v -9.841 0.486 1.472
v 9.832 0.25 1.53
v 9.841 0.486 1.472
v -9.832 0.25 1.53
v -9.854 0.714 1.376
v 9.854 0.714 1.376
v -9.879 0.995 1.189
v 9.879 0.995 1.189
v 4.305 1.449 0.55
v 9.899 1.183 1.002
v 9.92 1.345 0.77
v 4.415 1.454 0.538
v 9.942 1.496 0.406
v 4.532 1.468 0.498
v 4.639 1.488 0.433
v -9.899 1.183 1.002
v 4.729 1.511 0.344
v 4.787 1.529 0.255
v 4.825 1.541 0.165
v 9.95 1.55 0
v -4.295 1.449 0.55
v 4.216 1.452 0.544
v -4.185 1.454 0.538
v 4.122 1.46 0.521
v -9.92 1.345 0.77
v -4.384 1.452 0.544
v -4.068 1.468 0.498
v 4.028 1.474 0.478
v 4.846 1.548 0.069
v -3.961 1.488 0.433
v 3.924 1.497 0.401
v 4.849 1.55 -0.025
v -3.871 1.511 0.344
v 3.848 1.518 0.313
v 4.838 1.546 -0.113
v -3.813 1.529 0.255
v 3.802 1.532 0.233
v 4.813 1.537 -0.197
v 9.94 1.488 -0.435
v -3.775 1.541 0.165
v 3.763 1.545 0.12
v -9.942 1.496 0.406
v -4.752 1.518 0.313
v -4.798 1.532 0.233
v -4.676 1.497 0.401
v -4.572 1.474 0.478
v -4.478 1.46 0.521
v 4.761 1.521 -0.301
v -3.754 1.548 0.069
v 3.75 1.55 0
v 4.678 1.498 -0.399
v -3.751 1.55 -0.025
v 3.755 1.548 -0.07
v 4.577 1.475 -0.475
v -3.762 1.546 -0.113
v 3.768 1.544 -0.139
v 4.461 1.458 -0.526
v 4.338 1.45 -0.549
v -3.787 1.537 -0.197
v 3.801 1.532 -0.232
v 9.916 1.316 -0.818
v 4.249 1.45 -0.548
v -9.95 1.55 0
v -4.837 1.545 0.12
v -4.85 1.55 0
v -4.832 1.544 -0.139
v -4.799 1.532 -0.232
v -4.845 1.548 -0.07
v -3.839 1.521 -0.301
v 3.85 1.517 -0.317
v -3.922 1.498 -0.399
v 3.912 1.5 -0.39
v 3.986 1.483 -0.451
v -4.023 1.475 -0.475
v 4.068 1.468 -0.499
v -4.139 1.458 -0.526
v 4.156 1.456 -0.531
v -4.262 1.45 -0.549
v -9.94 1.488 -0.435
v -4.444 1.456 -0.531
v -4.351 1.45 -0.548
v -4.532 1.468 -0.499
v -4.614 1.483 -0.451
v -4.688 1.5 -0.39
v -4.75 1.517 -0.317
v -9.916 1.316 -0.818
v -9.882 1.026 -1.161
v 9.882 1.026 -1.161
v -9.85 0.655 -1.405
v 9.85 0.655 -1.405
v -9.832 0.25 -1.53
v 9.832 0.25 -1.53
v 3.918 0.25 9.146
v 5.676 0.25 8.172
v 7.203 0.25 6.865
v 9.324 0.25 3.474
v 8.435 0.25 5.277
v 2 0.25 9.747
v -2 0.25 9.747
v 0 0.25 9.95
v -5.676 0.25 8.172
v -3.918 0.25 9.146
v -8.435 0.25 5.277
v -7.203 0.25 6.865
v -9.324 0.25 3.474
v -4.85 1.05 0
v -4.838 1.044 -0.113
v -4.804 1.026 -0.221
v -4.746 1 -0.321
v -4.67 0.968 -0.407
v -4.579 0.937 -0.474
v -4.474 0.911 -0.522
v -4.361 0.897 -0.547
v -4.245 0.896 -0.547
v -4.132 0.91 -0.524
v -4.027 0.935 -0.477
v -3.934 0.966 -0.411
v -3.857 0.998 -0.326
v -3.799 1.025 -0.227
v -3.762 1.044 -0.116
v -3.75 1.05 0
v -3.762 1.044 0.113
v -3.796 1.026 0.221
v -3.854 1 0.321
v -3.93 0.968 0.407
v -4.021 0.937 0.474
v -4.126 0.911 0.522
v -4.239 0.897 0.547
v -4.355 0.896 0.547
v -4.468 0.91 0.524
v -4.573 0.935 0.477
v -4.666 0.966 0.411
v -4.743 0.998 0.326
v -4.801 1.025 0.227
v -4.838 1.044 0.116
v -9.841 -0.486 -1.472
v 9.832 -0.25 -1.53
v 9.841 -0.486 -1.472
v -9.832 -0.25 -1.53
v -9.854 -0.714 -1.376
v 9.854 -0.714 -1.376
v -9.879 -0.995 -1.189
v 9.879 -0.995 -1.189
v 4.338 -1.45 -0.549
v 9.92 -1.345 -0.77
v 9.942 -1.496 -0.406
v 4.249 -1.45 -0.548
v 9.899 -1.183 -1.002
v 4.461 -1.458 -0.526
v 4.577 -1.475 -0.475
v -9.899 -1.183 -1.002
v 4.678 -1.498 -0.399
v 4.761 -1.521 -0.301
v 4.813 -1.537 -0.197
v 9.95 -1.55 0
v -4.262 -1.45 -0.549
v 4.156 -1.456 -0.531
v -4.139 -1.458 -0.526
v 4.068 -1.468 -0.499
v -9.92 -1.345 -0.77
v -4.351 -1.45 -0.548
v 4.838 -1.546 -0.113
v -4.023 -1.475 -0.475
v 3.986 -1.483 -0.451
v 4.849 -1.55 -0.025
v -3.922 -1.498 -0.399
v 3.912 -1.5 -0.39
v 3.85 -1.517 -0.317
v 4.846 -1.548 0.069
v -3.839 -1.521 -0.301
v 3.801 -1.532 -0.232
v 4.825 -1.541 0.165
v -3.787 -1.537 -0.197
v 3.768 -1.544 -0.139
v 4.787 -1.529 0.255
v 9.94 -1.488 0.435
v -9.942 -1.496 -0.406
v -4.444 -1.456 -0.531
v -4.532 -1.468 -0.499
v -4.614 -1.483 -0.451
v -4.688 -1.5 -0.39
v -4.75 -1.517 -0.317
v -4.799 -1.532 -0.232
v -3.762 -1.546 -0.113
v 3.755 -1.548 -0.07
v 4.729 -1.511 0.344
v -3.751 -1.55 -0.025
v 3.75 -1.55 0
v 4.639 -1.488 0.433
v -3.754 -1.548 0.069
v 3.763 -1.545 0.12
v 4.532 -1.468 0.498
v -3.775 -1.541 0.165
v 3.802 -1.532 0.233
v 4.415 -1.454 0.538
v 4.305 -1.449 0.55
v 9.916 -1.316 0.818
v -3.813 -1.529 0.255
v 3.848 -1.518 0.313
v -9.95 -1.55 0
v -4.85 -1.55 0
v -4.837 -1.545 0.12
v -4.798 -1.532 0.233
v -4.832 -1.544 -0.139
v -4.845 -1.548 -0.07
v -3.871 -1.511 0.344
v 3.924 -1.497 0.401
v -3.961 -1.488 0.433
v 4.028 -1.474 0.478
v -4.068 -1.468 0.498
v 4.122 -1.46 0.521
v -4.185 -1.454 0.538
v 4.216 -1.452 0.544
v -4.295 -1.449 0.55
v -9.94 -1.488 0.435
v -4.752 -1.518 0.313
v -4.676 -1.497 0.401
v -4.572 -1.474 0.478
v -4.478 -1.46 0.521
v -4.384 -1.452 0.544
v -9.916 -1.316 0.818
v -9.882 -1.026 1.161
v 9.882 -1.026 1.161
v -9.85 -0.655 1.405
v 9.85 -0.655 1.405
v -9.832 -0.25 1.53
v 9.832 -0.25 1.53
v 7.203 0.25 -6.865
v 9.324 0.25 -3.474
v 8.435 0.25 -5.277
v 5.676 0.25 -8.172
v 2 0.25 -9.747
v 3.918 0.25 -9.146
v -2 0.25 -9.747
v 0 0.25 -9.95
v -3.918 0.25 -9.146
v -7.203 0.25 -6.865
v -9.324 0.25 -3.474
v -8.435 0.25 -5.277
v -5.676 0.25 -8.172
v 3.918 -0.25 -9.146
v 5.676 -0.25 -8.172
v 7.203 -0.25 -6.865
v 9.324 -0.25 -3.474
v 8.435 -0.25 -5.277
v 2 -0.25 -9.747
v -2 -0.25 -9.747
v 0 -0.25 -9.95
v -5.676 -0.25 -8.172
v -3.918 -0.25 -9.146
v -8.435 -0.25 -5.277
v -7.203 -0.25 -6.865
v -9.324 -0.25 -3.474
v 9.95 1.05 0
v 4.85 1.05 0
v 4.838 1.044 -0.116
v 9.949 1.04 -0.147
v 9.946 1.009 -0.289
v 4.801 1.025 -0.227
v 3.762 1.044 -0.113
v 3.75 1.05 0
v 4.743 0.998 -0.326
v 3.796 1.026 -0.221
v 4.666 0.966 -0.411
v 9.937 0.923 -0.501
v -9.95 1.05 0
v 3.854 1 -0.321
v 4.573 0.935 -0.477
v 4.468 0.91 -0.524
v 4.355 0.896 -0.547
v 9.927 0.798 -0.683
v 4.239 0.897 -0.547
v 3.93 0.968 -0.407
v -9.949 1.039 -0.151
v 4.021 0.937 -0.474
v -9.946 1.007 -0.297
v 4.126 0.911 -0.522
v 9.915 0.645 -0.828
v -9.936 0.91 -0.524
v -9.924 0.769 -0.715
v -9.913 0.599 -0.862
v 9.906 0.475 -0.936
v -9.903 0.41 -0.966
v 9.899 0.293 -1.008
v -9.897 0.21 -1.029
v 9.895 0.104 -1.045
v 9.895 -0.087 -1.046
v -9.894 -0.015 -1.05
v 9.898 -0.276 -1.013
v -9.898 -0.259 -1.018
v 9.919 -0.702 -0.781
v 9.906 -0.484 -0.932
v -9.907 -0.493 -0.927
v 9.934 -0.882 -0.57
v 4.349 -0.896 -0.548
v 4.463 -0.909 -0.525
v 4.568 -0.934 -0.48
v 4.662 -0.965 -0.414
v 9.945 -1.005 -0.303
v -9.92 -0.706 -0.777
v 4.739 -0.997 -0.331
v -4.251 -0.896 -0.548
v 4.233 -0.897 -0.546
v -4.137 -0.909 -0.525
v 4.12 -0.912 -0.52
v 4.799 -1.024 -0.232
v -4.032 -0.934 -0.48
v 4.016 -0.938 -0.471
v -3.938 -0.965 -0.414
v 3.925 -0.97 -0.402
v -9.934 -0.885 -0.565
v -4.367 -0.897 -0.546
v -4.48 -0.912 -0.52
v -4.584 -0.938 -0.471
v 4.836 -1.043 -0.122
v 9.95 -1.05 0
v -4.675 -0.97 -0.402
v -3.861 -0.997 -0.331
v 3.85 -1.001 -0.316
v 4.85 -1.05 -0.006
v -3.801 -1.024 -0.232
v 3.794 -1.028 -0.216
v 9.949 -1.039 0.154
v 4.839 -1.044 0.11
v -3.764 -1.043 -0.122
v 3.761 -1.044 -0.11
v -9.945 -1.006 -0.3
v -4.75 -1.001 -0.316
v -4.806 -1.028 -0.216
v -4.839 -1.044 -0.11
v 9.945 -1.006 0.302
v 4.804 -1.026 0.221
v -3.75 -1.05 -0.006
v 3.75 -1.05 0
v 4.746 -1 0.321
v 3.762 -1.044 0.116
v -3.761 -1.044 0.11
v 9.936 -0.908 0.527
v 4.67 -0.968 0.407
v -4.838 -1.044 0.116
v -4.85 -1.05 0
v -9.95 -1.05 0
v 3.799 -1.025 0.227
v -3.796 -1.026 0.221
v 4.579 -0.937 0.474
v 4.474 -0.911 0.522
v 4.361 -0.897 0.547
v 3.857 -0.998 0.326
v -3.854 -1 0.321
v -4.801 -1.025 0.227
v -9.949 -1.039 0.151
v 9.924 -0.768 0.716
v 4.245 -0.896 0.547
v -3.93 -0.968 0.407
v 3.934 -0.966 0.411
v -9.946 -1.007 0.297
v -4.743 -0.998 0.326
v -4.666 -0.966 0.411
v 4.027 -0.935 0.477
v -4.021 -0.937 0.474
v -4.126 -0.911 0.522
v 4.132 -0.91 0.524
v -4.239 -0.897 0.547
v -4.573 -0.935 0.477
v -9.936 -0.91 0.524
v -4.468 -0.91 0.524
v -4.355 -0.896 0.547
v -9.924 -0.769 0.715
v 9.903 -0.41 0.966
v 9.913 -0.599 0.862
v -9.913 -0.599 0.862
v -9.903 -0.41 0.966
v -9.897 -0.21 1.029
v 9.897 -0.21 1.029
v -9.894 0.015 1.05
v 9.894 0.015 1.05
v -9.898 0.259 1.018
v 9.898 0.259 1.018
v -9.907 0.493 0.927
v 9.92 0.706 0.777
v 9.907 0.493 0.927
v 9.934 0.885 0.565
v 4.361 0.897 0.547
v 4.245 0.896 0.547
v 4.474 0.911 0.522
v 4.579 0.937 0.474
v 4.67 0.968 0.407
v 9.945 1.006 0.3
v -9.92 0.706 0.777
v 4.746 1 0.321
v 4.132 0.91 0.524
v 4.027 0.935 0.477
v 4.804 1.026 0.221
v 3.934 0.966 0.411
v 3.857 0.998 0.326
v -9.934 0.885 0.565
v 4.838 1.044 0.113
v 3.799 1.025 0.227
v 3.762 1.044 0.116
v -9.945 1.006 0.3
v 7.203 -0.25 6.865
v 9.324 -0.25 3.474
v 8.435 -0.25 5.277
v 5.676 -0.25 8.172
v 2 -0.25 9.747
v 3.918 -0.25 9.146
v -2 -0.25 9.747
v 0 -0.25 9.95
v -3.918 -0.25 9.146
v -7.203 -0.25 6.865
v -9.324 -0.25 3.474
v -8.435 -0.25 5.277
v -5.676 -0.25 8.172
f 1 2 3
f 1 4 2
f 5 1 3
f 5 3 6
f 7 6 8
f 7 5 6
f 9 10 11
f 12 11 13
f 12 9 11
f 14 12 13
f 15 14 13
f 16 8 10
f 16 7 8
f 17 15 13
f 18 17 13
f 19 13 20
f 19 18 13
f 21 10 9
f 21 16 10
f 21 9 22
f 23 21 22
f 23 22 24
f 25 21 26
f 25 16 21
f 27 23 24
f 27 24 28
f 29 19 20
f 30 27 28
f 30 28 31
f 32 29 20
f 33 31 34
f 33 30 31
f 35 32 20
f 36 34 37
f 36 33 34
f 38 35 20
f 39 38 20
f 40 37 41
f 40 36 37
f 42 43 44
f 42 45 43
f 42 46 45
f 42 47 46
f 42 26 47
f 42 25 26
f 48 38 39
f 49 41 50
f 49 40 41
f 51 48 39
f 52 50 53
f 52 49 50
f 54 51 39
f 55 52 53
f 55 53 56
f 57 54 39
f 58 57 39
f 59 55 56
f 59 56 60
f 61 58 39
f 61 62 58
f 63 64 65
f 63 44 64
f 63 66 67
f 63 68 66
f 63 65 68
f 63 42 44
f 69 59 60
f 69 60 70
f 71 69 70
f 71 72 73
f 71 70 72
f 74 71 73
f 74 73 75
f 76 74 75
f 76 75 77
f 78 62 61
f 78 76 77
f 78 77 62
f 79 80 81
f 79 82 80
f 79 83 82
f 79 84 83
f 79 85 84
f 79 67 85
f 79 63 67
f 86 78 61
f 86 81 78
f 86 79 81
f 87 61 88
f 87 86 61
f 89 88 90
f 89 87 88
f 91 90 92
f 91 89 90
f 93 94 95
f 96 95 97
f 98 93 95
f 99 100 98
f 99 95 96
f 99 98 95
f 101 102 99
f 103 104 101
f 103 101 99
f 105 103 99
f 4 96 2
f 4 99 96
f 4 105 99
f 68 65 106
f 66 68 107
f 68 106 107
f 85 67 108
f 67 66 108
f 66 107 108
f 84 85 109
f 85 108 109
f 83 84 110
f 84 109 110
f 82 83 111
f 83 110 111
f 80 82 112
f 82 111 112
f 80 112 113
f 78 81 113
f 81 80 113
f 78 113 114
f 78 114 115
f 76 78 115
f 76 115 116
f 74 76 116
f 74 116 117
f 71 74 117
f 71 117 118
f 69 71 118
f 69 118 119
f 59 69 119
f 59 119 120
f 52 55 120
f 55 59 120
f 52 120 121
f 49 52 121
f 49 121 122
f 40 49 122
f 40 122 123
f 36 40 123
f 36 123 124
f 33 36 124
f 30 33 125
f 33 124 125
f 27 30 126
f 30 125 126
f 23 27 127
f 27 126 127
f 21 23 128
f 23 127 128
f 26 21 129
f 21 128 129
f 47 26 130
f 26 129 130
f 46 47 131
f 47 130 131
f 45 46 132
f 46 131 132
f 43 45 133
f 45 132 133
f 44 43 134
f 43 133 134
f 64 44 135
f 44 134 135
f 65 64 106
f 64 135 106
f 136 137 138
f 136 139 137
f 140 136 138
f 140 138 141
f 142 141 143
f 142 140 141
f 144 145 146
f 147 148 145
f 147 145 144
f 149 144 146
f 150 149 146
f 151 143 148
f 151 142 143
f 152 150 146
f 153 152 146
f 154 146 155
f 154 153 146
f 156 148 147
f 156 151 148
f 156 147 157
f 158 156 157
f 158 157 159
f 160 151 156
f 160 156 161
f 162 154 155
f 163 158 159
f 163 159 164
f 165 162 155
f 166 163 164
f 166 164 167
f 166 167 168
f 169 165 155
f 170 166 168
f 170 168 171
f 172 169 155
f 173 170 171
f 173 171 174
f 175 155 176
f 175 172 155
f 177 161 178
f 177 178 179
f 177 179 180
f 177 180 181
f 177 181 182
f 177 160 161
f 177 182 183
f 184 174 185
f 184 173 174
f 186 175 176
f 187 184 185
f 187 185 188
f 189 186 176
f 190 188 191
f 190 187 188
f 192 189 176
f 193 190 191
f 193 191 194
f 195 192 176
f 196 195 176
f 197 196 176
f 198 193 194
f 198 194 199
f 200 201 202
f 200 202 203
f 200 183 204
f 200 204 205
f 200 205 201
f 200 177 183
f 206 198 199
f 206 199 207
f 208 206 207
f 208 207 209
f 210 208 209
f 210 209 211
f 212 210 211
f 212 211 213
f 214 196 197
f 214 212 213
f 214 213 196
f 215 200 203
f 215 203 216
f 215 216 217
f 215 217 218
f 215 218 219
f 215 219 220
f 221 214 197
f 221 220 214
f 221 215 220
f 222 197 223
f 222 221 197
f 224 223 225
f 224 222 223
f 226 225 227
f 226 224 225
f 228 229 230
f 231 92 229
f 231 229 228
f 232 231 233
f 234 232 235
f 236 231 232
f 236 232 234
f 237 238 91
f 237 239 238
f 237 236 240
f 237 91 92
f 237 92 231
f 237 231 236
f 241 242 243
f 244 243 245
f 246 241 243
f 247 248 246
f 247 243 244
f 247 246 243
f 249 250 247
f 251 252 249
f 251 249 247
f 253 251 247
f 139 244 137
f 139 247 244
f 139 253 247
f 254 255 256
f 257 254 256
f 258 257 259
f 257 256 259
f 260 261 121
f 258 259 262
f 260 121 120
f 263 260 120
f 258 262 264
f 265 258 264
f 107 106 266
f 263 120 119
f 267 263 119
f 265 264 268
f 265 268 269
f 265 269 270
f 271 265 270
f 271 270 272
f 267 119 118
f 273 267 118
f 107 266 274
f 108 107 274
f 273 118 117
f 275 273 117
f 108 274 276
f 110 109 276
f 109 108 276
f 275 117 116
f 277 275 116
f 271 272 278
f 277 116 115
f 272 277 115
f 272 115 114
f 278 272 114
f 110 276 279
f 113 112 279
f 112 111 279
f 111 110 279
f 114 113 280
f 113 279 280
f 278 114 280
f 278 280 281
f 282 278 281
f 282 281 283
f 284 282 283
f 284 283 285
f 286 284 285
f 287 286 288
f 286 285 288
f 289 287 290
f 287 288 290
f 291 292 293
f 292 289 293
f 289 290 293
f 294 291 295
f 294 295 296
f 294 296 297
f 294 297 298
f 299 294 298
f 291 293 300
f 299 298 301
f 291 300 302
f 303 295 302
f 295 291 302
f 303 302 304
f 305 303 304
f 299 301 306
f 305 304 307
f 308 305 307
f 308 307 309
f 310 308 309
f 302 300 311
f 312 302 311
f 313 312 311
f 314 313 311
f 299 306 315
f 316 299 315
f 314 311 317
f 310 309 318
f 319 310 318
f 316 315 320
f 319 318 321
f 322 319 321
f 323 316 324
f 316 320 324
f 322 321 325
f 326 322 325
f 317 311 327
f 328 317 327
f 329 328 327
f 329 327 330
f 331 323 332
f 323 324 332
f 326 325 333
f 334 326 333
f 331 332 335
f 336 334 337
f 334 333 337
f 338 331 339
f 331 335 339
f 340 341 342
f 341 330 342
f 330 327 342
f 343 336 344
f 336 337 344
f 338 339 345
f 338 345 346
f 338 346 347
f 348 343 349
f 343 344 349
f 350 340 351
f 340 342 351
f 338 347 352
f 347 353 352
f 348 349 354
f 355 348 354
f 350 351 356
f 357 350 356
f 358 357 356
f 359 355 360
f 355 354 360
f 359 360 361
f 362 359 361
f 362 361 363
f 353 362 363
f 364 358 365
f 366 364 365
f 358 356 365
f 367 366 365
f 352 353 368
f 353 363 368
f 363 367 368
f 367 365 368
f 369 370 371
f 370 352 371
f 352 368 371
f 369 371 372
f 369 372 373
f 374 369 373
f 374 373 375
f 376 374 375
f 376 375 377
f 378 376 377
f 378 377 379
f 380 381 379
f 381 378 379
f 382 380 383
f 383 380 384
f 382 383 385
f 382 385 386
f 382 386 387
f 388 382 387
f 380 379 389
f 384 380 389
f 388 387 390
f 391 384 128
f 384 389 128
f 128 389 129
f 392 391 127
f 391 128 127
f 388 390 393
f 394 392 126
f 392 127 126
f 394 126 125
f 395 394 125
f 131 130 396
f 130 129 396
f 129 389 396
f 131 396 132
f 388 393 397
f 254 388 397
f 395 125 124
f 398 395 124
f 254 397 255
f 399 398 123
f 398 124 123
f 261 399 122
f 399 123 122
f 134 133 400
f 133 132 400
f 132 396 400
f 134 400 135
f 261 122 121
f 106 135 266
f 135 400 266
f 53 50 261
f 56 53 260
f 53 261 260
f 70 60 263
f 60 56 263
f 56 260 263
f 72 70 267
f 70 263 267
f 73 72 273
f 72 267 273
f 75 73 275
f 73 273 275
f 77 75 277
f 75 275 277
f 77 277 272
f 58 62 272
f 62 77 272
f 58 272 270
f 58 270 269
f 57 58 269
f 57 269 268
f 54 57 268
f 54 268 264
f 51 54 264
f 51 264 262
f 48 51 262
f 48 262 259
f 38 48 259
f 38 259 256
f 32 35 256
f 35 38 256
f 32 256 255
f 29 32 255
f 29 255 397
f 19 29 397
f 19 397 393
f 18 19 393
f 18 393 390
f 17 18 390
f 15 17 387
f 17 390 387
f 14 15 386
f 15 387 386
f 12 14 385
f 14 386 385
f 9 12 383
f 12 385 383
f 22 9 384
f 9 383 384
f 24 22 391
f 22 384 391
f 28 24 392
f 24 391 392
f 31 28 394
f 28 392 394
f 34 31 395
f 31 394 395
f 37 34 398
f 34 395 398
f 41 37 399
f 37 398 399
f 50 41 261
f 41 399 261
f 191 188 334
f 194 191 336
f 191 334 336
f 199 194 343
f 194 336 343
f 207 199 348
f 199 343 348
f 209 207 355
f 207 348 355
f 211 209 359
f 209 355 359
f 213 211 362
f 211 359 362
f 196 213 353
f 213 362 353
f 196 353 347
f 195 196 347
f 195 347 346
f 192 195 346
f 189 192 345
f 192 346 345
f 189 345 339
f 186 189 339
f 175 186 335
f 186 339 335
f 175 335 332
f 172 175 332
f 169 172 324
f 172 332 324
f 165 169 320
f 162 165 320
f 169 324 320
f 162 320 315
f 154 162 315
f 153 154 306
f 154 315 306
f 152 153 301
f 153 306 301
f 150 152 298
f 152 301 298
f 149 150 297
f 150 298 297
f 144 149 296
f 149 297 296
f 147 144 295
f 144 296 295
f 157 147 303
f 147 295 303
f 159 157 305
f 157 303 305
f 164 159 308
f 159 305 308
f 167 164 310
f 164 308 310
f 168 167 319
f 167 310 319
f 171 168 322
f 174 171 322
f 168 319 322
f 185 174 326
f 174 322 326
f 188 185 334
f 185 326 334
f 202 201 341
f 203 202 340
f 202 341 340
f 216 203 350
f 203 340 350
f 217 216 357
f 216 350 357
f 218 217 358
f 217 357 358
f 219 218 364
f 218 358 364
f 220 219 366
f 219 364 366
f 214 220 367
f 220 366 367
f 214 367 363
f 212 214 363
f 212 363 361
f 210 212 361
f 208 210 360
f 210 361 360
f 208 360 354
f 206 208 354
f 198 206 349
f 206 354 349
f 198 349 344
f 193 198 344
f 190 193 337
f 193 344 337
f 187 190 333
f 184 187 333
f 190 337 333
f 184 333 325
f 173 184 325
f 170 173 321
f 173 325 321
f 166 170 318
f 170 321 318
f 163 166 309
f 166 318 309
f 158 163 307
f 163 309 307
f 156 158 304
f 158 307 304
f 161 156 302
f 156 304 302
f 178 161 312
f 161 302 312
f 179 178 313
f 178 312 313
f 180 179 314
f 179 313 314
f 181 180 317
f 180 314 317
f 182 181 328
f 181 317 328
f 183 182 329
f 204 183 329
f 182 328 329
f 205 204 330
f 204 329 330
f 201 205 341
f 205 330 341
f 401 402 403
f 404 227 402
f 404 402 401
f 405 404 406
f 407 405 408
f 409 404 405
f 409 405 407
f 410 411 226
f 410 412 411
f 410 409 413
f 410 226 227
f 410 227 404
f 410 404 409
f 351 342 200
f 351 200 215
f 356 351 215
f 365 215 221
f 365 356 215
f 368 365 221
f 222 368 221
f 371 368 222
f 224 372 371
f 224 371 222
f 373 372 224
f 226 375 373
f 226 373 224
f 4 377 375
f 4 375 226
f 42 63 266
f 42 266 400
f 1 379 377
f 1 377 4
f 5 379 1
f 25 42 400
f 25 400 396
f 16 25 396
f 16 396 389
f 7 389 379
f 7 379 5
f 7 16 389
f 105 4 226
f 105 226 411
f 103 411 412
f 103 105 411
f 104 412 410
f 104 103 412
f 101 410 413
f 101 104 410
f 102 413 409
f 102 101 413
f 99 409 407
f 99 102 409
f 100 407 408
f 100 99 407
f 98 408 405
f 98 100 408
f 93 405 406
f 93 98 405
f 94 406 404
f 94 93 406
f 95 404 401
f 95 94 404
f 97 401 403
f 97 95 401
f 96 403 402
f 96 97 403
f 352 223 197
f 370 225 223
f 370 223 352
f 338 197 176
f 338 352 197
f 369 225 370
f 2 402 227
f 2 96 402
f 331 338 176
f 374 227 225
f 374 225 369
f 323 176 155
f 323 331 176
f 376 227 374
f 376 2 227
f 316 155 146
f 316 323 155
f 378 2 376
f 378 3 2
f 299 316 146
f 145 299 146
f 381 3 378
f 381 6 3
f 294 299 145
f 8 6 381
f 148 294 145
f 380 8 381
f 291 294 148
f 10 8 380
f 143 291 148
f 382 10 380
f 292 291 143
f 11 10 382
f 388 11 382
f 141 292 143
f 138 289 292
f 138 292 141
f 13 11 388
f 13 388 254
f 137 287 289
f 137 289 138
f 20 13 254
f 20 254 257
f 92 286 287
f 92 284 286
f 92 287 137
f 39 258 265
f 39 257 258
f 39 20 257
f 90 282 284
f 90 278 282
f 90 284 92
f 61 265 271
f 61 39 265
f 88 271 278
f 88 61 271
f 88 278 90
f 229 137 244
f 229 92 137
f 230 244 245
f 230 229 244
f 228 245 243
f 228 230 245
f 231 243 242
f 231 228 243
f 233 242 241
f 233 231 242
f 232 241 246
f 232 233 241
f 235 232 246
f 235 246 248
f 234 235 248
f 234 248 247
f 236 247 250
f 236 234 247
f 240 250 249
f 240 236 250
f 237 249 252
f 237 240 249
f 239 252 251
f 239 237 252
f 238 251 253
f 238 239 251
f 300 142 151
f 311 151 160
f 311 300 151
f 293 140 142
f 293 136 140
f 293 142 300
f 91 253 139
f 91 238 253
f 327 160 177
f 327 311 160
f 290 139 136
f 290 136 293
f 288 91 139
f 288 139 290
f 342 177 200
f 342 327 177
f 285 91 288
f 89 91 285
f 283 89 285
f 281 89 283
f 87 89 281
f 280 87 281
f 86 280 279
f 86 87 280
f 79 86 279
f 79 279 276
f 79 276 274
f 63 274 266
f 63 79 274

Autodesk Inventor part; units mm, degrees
ref_plane "YZ Plane" through (0, 0, 0) normal (1, 0, 0) x (0, 1, 0)
ref_plane "XZ Plane" through (0, 0, 0) normal (0, 1, 0) x (-1, 0, 0)
ref_plane "XY Plane" through (0, 0, 0) normal (0, 0, 1) x (1, 0, 0)
sketch "Sketch1" plane through (0, 0, 0) normal (1, 0, 0) x (0, 1, 0)
  line L0 (-0.25, 9.95) -> (0.25, 9.95)
  line L1 (0.25, -9.95) -> (-0.25, -9.95)
  line L2 (-0.25, 9.95) -> (0.25, -9.95) construction
  line L3 (0.25, 9.95) -> (-0.25, -9.95) construction
  circle A0 centre (0, 0) radius 1.05
  line L4 (0.25, 9.95) -> (0.25, 1.5297)
  line L5 (0.25, -1.5297) -> (0.25, -9.95)
  line L6 (-0.25, -9.95) -> (-0.25, -1.5297)
  line L7 (-0.25, 1.5297) -> (-0.25, 9.95)
  arc A1 (0.25, -1.5297) -> (0.25, 1.5297) centre (0, 0) ccw
  arc A2 (-0.25, 1.5297) -> (-0.25, -1.5297) centre (0, 0) ccw
  dimension "d0" = 0.5
  dimension "d1" = 19.9
  dimension "d3" = 2.1
  dimension "d4" = 0.5
extrude "Extrusion1" add sketch "Sketch1" along normal mid plane 19.9
sketch "Sketch2" plane through (0, 0, 0) normal (0, 1, 0) x (-1, 0, 0)
  circle A0 centre (0, 0) radius 9.95
  circle A1 centre (-4.3, 0) radius 0.55
  line L0 (9.95, 1.5297) -> (-9.95, 1.5297) projected
  line L1 (0, 1.5297) -> (0, -1.5297)
  line L2 (-9.95, -1.5297) -> (9.95, -1.5297) projected
  circle A2 centre (4.3, 0) radius 0.55
  dimension "d7" = 19.9
  dimension "d10" = 1.1
  dimension "d11" = 7.5
extrude "Extrusion2" cut sketch "Sketch2" along normal mid plane 10 keep common part
properties part number "flap"
